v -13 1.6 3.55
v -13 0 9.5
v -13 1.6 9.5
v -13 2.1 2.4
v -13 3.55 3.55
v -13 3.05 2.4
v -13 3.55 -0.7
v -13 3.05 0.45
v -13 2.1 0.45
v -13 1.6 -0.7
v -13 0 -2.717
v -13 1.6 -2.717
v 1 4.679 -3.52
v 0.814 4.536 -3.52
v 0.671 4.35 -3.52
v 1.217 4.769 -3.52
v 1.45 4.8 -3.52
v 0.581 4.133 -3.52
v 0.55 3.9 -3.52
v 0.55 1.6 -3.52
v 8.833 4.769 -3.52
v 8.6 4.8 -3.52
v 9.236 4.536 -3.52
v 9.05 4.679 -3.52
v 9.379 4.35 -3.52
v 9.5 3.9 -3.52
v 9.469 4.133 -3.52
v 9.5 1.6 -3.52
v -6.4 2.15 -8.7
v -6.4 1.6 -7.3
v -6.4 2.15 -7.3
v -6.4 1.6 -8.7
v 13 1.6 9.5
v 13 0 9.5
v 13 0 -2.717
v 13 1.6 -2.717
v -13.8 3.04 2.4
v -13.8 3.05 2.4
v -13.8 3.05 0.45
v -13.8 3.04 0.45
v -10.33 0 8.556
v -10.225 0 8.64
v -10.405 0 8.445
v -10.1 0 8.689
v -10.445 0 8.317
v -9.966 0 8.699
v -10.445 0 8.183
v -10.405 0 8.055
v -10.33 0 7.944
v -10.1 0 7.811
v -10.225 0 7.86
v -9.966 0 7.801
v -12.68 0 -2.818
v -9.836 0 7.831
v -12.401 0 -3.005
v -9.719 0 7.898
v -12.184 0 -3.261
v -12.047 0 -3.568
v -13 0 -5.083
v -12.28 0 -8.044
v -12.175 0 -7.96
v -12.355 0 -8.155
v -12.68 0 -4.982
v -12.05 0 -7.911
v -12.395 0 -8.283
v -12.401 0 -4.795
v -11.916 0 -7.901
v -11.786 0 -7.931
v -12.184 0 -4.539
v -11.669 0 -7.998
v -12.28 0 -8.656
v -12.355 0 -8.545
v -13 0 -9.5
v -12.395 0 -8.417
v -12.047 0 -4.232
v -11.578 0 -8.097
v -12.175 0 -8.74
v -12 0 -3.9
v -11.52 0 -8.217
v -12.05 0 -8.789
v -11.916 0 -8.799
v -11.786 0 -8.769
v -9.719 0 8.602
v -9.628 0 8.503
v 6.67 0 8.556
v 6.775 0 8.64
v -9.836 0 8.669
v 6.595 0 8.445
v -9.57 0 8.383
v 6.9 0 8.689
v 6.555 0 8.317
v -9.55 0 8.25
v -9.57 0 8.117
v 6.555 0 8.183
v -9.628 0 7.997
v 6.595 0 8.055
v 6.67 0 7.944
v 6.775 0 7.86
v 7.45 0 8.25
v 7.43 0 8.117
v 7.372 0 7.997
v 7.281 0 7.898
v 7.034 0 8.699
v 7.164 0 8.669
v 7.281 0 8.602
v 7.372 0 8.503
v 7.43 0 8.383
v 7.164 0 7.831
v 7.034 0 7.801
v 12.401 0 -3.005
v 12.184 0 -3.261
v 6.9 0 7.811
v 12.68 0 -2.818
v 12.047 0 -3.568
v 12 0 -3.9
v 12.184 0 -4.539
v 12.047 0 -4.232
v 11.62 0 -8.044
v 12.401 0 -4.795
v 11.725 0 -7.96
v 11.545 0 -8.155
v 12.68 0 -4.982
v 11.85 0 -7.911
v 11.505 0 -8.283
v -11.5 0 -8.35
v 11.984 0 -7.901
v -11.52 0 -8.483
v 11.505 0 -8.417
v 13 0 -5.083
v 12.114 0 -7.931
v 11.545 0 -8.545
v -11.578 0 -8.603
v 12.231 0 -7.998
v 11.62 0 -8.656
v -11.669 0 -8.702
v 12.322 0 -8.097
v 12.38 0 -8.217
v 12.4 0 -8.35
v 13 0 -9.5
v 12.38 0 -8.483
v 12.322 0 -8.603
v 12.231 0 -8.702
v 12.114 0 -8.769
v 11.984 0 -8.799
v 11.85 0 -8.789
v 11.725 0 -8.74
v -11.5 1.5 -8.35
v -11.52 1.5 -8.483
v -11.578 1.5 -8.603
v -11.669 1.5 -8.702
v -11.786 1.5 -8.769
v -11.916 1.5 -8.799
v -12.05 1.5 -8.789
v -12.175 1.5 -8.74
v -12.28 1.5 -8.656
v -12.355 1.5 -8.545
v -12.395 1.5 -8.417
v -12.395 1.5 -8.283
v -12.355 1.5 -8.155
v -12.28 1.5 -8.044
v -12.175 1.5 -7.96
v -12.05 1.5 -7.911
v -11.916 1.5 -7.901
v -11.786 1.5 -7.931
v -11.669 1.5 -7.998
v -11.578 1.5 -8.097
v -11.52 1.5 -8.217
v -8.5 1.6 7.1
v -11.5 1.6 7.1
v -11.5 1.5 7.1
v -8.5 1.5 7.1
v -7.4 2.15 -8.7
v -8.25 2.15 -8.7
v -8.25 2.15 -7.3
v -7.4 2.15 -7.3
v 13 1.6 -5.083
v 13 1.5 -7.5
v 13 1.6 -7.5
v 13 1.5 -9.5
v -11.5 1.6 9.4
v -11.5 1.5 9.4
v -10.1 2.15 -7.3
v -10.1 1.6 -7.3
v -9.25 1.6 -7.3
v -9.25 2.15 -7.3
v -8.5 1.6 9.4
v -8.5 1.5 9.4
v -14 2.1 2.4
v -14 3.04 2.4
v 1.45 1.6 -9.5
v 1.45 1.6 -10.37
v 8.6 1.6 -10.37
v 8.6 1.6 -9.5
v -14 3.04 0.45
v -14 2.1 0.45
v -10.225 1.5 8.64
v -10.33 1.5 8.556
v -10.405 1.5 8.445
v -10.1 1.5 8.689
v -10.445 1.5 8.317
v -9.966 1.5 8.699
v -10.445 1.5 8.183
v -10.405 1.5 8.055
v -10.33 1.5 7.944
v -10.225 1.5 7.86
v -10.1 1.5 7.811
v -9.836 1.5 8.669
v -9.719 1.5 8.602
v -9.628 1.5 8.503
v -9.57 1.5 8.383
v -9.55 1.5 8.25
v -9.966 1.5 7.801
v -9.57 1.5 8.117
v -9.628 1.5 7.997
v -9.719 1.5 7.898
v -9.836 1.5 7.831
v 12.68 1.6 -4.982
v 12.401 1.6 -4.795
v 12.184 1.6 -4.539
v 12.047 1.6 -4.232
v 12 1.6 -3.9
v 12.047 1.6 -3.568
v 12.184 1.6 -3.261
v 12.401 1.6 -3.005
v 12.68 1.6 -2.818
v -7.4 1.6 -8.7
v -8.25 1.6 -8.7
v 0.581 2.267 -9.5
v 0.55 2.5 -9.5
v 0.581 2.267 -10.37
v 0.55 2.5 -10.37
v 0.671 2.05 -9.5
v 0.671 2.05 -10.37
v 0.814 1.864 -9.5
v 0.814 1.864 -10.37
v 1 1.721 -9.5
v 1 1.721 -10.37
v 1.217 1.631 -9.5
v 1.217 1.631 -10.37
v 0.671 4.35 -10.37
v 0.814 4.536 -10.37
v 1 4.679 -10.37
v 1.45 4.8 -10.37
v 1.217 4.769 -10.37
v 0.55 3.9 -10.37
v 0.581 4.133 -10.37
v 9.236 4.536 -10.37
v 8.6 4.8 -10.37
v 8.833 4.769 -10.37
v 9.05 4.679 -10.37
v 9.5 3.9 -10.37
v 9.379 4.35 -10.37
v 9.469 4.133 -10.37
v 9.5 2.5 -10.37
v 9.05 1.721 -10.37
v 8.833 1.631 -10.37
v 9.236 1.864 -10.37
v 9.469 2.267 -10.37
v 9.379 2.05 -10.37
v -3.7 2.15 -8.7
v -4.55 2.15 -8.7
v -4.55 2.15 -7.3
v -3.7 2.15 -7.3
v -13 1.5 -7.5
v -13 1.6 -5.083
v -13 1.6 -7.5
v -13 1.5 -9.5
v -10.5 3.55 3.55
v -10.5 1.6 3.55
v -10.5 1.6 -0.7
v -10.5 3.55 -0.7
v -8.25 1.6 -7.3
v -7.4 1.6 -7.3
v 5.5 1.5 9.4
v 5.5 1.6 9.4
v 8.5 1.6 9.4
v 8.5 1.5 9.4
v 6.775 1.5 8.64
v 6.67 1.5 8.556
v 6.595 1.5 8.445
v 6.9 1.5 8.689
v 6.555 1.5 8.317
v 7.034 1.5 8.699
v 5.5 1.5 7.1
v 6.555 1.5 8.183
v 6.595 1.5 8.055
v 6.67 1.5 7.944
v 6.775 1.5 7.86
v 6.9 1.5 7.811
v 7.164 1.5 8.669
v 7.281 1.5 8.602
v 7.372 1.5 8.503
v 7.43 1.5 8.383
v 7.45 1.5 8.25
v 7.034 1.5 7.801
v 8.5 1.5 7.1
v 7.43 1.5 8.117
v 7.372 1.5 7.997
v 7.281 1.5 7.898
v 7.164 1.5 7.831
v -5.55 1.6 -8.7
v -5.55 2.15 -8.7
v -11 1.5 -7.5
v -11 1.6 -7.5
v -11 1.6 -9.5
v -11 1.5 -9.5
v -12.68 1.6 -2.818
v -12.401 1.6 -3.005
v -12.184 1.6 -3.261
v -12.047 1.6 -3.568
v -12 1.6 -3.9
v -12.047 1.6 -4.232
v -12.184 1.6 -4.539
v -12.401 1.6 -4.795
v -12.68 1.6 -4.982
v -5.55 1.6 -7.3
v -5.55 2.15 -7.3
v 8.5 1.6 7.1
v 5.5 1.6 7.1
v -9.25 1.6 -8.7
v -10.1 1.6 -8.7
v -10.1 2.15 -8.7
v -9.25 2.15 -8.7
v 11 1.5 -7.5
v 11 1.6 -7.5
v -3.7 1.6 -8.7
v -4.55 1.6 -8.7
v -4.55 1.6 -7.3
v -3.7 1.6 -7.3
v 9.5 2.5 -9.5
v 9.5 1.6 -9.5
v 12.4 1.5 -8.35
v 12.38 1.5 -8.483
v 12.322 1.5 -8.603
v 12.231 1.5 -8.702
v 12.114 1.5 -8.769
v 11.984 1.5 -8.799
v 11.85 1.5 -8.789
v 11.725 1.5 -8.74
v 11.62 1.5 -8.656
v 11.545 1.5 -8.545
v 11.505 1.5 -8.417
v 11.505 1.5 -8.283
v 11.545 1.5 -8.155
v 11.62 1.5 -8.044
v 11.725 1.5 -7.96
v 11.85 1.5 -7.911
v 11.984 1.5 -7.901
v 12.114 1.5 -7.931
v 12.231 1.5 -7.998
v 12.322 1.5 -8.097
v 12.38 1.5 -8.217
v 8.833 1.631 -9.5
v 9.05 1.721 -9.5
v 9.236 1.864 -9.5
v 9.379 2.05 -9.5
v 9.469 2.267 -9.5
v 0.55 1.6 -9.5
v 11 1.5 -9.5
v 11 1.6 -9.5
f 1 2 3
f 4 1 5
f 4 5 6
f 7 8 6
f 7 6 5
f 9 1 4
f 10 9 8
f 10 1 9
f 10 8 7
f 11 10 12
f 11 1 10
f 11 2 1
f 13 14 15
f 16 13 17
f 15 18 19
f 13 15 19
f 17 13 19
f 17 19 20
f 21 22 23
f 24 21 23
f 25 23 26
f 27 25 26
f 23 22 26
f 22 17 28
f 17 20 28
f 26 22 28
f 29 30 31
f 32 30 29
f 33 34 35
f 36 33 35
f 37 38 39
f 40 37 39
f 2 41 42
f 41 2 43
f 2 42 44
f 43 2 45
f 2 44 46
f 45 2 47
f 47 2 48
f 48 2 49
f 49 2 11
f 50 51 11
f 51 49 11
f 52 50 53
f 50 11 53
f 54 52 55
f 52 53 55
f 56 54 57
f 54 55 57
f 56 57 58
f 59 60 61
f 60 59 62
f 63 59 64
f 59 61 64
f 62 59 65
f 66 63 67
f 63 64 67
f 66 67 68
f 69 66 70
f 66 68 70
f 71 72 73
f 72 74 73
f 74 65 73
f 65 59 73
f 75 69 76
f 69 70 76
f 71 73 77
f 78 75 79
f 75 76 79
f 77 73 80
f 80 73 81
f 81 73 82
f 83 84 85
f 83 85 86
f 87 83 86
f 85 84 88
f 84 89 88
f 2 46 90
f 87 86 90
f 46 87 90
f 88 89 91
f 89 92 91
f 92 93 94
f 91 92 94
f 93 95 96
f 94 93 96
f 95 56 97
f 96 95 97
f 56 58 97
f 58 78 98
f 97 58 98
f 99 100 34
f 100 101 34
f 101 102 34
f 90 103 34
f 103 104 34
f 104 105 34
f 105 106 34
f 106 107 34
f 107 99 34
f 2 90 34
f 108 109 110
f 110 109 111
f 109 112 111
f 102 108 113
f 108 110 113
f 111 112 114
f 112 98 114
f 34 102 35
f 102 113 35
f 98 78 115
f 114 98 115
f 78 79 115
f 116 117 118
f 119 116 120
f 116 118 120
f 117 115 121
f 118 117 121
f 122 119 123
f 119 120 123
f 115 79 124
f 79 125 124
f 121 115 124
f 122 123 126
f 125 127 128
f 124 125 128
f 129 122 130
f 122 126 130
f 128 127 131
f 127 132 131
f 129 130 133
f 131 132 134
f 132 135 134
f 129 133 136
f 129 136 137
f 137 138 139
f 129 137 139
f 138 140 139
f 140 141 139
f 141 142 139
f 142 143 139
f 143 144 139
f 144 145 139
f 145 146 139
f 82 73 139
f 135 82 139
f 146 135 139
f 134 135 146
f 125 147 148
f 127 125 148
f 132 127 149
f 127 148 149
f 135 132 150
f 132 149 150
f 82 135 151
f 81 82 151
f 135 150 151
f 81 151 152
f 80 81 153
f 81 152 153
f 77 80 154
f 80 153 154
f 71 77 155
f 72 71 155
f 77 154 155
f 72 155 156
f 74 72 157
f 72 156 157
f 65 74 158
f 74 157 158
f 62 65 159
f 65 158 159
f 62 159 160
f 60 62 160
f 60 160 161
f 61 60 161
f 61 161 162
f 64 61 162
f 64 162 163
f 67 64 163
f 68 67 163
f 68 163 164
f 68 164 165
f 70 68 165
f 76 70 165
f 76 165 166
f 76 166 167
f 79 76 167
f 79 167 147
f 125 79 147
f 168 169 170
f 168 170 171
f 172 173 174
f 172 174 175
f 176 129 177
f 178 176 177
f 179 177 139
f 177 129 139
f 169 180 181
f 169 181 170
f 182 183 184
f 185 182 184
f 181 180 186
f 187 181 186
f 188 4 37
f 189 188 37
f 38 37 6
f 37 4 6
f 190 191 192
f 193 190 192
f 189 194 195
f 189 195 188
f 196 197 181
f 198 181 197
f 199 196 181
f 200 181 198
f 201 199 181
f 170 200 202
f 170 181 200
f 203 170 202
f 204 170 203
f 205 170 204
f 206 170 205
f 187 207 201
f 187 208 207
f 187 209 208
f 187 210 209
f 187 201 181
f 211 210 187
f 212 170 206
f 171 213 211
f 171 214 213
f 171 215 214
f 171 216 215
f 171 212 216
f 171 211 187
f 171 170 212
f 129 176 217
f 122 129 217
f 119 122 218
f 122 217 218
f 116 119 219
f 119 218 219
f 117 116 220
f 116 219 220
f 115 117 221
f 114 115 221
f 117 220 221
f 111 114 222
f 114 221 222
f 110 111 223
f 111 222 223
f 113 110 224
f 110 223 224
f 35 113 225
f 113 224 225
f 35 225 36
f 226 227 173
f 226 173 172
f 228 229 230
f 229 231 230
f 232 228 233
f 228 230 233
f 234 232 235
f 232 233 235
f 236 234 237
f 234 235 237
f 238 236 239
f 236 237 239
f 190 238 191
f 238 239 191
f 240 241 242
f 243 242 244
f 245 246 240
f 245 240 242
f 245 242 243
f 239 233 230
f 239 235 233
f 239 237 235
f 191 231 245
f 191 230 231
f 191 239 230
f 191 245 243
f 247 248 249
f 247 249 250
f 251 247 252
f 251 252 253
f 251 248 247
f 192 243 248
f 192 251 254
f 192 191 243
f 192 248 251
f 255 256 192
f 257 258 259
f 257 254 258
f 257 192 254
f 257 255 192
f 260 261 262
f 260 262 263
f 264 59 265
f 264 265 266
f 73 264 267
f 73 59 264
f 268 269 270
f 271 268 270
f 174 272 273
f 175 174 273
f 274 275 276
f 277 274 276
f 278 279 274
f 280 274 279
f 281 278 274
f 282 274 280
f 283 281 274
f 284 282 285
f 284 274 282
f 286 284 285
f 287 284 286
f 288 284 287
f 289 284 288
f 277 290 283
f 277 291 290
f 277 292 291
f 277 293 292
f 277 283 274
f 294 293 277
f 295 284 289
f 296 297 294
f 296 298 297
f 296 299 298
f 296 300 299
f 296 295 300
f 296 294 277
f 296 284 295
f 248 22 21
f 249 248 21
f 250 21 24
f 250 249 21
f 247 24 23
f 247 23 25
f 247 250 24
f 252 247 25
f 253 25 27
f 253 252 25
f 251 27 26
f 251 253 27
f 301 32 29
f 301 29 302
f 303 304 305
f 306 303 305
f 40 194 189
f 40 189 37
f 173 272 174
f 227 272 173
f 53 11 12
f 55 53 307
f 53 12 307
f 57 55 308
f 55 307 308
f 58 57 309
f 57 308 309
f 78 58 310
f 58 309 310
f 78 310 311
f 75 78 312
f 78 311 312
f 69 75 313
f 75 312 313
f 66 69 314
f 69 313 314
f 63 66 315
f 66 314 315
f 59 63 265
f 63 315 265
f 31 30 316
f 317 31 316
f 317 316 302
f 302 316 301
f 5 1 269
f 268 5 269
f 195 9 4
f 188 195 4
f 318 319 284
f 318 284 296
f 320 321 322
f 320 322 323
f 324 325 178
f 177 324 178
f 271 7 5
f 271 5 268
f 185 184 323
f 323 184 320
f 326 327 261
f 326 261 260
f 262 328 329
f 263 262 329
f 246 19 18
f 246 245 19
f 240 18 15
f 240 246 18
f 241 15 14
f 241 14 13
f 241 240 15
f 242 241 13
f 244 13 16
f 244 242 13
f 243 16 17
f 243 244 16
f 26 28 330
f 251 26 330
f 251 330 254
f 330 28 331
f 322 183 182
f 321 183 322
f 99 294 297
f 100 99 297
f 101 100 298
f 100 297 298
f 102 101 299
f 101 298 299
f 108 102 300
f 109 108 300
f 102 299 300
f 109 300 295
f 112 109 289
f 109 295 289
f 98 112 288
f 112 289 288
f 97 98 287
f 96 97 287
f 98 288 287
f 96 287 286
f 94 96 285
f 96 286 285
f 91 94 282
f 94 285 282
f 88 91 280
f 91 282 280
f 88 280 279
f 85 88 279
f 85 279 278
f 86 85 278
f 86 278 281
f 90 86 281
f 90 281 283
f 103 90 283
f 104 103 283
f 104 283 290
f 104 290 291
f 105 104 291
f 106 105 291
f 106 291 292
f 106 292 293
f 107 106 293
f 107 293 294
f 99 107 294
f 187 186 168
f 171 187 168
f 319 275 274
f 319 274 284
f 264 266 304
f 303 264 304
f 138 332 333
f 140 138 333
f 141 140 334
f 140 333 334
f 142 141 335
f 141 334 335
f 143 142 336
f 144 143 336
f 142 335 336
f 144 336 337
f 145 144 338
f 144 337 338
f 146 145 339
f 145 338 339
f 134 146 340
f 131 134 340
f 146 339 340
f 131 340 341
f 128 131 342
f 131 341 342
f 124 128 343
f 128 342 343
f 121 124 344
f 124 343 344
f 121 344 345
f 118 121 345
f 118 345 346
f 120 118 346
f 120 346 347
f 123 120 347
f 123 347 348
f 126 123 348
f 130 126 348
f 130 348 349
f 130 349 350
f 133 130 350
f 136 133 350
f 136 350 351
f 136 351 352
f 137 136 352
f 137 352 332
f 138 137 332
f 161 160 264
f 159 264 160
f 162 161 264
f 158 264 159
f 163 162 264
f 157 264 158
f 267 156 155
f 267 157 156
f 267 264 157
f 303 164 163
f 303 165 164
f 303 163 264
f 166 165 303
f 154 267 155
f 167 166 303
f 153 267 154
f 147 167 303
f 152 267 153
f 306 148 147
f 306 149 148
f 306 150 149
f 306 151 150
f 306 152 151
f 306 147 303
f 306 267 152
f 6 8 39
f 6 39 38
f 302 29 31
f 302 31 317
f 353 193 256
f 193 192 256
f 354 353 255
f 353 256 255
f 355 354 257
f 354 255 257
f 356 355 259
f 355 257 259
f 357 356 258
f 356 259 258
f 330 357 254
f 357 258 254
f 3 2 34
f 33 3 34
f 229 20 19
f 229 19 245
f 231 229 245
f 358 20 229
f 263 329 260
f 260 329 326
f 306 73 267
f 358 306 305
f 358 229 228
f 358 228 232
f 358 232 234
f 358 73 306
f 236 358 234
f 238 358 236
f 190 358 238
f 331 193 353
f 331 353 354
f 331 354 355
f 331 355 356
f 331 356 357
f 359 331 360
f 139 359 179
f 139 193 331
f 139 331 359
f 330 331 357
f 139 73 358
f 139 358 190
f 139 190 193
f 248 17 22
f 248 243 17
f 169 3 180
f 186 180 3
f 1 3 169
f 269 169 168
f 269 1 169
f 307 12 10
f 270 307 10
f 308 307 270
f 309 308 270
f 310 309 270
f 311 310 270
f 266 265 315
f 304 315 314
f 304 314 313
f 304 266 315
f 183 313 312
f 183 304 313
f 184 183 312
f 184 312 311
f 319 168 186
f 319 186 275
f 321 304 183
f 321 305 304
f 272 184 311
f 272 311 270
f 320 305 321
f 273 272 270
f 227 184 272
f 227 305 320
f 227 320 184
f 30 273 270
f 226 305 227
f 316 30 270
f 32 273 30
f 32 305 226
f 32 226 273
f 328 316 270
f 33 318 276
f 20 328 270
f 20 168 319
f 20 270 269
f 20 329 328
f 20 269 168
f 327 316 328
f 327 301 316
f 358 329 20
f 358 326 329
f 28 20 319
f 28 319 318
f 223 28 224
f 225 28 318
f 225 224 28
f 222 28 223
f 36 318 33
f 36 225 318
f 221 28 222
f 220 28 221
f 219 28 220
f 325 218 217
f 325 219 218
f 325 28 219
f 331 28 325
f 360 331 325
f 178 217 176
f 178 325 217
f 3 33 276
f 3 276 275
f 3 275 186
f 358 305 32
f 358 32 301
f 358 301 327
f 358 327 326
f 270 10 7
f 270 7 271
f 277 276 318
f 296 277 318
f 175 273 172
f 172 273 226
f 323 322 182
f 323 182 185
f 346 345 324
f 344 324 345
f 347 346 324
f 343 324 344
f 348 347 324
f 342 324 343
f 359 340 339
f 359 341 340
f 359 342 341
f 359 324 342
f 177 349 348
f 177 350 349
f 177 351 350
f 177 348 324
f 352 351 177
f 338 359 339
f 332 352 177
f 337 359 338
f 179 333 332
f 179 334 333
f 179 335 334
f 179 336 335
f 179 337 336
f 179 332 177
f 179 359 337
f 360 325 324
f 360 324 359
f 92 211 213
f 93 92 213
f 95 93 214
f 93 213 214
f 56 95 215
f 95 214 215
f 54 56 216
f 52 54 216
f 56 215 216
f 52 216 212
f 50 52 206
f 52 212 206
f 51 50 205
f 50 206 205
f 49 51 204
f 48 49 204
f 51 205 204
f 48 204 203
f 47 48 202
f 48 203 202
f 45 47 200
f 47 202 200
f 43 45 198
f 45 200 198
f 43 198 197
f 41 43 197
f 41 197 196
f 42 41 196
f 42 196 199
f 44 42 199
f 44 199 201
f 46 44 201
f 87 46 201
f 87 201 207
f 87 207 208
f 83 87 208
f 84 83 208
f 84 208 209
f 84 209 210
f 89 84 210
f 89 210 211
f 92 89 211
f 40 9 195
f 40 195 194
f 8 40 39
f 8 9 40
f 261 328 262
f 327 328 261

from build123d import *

# Parameters (mm, degrees)
SKETCH1_W           = 26
SKETCH1_H           = 19
BOSS_EXTRUDE1_DEPTH = 1.6
SKETCH2_W           = 8.95
SKETCH2_H           = 6.85
BOSS_EXTRUDE2_DEPTH = 3.2
SKETCH3_R           = 0.45
CUT_EXTRUDE1_DEPTH  = 2.6
SKETCH4_R           = 1.2
CUT_EXTRUDE2_DEPTH  = 2.6
SKETCH5_R           = 0.45
CUT_EXTRUDE3_DEPTH  = 2.6
SKETCH6_W           = 2
SKETCH6_H           = 2
SKETCH6_W_2         = 3
SKETCH6_H_2         = 2.3
CUT_EXTRUDE4_DEPTH  = 0.1
FILLET1_R           = 0.9
SKETCH8_W           = 2.5
SKETCH8_H           = 4.25
BOSS_EXTRUDE3_DEPTH = 1.95
SKETCH9_W           = 1.95
SKETCH9_H           = 0.95
BOSS_EXTRUDE4_DEPTH = 1
SKETCH10_W          = 0.85
SKETCH10_H          = 1.4
BOSS_EXTRUDE5_DEPTH = 0.55
LPATTERN1_COUNT     = 4
LPATTERN1_PITCH     = 1.85
SKETCH11_W          = 0.2
SKETCH11_H          = 1.95
CUT_EXTRUDE5_DEPTH  = 0.01


with BuildPart() as part:
    # Sketch1 → Boss-Extrude1 (new body)
    with BuildSketch(Plane(origin=(0, 0, 0), x_dir=(1, 0, 0), z_dir=(0, 1, 0))):
        Rectangle(SKETCH1_W, SKETCH1_H)
    extrude(amount=BOSS_EXTRUDE1_DEPTH)

    # Sketch2 → Boss-Extrude2 (add)
    with BuildSketch(Plane(origin=(0, 1.6, 0), x_dir=(1, 0, 0), z_dir=(0, 1, 0))):
        with Locations((5.025, 6.945)):
            Rectangle(SKETCH2_W, SKETCH2_H)
    extrude(amount=BOSS_EXTRUDE2_DEPTH)

    # Sketch3 → Cut-Extrude1 (cut, through all)
    with BuildSketch(Plane(origin=(0, 1.6, 0), x_dir=(1, 0, 0), z_dir=(0, 1, 0))):
        with Locations((-10, -8.25)):
            Circle(SKETCH3_R)
        with Locations((7, -8.25)):
            Circle(SKETCH3_R)
    extrude(amount=-CUT_EXTRUDE1_DEPTH, mode=Mode.SUBTRACT)

    # Sketch4 → Cut-Extrude2 (cut, through all)
    with BuildSketch(Plane(origin=(0, 1.6, 0), x_dir=(1, 0, 0), z_dir=(0, 1, 0))):
        with Locations((-13.2, 3.9)):
            Circle(SKETCH4_R)
        with Locations((13.2, 3.9)):
            Circle(SKETCH4_R)
    extrude(amount=-CUT_EXTRUDE2_DEPTH, mode=Mode.SUBTRACT)

    # Sketch5 → Cut-Extrude3 (cut, through all)
    with BuildSketch(Plane(origin=(0, 1.6, 0), x_dir=(1, 0, 0), z_dir=(0, 1, 0))):
        with Locations((-11.95, 8.35)):
            Circle(SKETCH5_R)
        with Locations((11.95, 8.35)):
            Circle(SKETCH5_R)
    extrude(amount=-CUT_EXTRUDE3_DEPTH, mode=Mode.SUBTRACT)

    # Sketch6 → Cut-Extrude4 (cut)
    with BuildSketch(Plane(origin=(0, 1.6, 0), x_dir=(1, 0, 0), z_dir=(0, 1, 0))):
        with Locations((-12, 8.5)):
            Rectangle(SKETCH6_W, SKETCH6_H)
        with Locations((12, 8.5)):
            Rectangle(SKETCH6_W, SKETCH6_H)
        with Locations((-10, -8.25)):
            Rectangle(SKETCH6_W_2, SKETCH6_H_2)
        with Locations((7, -8.25)):
            Rectangle(SKETCH6_W_2, SKETCH6_H_2)
    extrude(amount=-CUT_EXTRUDE4_DEPTH, mode=Mode.SUBTRACT)

    # Fillet1
    fillet1_edges = [part.edges().sort_by_distance(p)[0] for p in [
        (0.55, 1.6, -9.935),
        (9.5, 1.6, -9.935),
        (0.55, 4.8, -6.945),
        (9.5, 4.8, -6.945),
    ]]
    fillet(fillet1_edges, radius=FILLET1_R)

    # Sketch8 → Boss-Extrude3 (add)
    with BuildSketch(Plane(origin=(0, 1.6, 0), x_dir=(1, 0, 0), z_dir=(0, 1, 0))):
        with Locations((-11.75, -1.425)):
            Rectangle(SKETCH8_W, SKETCH8_H)
    extrude(amount=BOSS_EXTRUDE3_DEPTH)

    # Sketch9 → Boss-Extrude4 (add)
    with BuildSketch(Plane.ZY.offset(13)):
        with Locations((1.425, 2.575)):
            Rectangle(SKETCH9_W, SKETCH9_H)
    extrude(amount=BOSS_EXTRUDE4_DEPTH)

    # Sketch10 → Boss-Extrude5 (add)
    with BuildSketch(Plane(origin=(0, 1.6, 0), x_dir=(1, 0, 0), z_dir=(0, 1, 0))):
        with Locations((-9.675, 8)):
            Rectangle(SKETCH10_W, SKETCH10_H)
    boss_extrude5 = extrude(amount=BOSS_EXTRUDE5_DEPTH)

    # LPattern1: Boss-Extrude5 ×4
    with Locations(*[(i * LPATTERN1_PITCH, 0, 0) for i in range(1, LPATTERN1_COUNT)]):
        add(boss_extrude5)

    # Sketch11 → Cut-Extrude5 (cut)
    with BuildSketch(Plane(origin=(0, 3.05, 0), x_dir=(1, 0, 0), z_dir=(0, 1, 0))):
        with Locations((-13.9, -1.425)):
            Rectangle(SKETCH11_W, SKETCH11_H)
    extrude(amount=-CUT_EXTRUDE5_DEPTH, mode=Mode.SUBTRACT)


solid = part.part
